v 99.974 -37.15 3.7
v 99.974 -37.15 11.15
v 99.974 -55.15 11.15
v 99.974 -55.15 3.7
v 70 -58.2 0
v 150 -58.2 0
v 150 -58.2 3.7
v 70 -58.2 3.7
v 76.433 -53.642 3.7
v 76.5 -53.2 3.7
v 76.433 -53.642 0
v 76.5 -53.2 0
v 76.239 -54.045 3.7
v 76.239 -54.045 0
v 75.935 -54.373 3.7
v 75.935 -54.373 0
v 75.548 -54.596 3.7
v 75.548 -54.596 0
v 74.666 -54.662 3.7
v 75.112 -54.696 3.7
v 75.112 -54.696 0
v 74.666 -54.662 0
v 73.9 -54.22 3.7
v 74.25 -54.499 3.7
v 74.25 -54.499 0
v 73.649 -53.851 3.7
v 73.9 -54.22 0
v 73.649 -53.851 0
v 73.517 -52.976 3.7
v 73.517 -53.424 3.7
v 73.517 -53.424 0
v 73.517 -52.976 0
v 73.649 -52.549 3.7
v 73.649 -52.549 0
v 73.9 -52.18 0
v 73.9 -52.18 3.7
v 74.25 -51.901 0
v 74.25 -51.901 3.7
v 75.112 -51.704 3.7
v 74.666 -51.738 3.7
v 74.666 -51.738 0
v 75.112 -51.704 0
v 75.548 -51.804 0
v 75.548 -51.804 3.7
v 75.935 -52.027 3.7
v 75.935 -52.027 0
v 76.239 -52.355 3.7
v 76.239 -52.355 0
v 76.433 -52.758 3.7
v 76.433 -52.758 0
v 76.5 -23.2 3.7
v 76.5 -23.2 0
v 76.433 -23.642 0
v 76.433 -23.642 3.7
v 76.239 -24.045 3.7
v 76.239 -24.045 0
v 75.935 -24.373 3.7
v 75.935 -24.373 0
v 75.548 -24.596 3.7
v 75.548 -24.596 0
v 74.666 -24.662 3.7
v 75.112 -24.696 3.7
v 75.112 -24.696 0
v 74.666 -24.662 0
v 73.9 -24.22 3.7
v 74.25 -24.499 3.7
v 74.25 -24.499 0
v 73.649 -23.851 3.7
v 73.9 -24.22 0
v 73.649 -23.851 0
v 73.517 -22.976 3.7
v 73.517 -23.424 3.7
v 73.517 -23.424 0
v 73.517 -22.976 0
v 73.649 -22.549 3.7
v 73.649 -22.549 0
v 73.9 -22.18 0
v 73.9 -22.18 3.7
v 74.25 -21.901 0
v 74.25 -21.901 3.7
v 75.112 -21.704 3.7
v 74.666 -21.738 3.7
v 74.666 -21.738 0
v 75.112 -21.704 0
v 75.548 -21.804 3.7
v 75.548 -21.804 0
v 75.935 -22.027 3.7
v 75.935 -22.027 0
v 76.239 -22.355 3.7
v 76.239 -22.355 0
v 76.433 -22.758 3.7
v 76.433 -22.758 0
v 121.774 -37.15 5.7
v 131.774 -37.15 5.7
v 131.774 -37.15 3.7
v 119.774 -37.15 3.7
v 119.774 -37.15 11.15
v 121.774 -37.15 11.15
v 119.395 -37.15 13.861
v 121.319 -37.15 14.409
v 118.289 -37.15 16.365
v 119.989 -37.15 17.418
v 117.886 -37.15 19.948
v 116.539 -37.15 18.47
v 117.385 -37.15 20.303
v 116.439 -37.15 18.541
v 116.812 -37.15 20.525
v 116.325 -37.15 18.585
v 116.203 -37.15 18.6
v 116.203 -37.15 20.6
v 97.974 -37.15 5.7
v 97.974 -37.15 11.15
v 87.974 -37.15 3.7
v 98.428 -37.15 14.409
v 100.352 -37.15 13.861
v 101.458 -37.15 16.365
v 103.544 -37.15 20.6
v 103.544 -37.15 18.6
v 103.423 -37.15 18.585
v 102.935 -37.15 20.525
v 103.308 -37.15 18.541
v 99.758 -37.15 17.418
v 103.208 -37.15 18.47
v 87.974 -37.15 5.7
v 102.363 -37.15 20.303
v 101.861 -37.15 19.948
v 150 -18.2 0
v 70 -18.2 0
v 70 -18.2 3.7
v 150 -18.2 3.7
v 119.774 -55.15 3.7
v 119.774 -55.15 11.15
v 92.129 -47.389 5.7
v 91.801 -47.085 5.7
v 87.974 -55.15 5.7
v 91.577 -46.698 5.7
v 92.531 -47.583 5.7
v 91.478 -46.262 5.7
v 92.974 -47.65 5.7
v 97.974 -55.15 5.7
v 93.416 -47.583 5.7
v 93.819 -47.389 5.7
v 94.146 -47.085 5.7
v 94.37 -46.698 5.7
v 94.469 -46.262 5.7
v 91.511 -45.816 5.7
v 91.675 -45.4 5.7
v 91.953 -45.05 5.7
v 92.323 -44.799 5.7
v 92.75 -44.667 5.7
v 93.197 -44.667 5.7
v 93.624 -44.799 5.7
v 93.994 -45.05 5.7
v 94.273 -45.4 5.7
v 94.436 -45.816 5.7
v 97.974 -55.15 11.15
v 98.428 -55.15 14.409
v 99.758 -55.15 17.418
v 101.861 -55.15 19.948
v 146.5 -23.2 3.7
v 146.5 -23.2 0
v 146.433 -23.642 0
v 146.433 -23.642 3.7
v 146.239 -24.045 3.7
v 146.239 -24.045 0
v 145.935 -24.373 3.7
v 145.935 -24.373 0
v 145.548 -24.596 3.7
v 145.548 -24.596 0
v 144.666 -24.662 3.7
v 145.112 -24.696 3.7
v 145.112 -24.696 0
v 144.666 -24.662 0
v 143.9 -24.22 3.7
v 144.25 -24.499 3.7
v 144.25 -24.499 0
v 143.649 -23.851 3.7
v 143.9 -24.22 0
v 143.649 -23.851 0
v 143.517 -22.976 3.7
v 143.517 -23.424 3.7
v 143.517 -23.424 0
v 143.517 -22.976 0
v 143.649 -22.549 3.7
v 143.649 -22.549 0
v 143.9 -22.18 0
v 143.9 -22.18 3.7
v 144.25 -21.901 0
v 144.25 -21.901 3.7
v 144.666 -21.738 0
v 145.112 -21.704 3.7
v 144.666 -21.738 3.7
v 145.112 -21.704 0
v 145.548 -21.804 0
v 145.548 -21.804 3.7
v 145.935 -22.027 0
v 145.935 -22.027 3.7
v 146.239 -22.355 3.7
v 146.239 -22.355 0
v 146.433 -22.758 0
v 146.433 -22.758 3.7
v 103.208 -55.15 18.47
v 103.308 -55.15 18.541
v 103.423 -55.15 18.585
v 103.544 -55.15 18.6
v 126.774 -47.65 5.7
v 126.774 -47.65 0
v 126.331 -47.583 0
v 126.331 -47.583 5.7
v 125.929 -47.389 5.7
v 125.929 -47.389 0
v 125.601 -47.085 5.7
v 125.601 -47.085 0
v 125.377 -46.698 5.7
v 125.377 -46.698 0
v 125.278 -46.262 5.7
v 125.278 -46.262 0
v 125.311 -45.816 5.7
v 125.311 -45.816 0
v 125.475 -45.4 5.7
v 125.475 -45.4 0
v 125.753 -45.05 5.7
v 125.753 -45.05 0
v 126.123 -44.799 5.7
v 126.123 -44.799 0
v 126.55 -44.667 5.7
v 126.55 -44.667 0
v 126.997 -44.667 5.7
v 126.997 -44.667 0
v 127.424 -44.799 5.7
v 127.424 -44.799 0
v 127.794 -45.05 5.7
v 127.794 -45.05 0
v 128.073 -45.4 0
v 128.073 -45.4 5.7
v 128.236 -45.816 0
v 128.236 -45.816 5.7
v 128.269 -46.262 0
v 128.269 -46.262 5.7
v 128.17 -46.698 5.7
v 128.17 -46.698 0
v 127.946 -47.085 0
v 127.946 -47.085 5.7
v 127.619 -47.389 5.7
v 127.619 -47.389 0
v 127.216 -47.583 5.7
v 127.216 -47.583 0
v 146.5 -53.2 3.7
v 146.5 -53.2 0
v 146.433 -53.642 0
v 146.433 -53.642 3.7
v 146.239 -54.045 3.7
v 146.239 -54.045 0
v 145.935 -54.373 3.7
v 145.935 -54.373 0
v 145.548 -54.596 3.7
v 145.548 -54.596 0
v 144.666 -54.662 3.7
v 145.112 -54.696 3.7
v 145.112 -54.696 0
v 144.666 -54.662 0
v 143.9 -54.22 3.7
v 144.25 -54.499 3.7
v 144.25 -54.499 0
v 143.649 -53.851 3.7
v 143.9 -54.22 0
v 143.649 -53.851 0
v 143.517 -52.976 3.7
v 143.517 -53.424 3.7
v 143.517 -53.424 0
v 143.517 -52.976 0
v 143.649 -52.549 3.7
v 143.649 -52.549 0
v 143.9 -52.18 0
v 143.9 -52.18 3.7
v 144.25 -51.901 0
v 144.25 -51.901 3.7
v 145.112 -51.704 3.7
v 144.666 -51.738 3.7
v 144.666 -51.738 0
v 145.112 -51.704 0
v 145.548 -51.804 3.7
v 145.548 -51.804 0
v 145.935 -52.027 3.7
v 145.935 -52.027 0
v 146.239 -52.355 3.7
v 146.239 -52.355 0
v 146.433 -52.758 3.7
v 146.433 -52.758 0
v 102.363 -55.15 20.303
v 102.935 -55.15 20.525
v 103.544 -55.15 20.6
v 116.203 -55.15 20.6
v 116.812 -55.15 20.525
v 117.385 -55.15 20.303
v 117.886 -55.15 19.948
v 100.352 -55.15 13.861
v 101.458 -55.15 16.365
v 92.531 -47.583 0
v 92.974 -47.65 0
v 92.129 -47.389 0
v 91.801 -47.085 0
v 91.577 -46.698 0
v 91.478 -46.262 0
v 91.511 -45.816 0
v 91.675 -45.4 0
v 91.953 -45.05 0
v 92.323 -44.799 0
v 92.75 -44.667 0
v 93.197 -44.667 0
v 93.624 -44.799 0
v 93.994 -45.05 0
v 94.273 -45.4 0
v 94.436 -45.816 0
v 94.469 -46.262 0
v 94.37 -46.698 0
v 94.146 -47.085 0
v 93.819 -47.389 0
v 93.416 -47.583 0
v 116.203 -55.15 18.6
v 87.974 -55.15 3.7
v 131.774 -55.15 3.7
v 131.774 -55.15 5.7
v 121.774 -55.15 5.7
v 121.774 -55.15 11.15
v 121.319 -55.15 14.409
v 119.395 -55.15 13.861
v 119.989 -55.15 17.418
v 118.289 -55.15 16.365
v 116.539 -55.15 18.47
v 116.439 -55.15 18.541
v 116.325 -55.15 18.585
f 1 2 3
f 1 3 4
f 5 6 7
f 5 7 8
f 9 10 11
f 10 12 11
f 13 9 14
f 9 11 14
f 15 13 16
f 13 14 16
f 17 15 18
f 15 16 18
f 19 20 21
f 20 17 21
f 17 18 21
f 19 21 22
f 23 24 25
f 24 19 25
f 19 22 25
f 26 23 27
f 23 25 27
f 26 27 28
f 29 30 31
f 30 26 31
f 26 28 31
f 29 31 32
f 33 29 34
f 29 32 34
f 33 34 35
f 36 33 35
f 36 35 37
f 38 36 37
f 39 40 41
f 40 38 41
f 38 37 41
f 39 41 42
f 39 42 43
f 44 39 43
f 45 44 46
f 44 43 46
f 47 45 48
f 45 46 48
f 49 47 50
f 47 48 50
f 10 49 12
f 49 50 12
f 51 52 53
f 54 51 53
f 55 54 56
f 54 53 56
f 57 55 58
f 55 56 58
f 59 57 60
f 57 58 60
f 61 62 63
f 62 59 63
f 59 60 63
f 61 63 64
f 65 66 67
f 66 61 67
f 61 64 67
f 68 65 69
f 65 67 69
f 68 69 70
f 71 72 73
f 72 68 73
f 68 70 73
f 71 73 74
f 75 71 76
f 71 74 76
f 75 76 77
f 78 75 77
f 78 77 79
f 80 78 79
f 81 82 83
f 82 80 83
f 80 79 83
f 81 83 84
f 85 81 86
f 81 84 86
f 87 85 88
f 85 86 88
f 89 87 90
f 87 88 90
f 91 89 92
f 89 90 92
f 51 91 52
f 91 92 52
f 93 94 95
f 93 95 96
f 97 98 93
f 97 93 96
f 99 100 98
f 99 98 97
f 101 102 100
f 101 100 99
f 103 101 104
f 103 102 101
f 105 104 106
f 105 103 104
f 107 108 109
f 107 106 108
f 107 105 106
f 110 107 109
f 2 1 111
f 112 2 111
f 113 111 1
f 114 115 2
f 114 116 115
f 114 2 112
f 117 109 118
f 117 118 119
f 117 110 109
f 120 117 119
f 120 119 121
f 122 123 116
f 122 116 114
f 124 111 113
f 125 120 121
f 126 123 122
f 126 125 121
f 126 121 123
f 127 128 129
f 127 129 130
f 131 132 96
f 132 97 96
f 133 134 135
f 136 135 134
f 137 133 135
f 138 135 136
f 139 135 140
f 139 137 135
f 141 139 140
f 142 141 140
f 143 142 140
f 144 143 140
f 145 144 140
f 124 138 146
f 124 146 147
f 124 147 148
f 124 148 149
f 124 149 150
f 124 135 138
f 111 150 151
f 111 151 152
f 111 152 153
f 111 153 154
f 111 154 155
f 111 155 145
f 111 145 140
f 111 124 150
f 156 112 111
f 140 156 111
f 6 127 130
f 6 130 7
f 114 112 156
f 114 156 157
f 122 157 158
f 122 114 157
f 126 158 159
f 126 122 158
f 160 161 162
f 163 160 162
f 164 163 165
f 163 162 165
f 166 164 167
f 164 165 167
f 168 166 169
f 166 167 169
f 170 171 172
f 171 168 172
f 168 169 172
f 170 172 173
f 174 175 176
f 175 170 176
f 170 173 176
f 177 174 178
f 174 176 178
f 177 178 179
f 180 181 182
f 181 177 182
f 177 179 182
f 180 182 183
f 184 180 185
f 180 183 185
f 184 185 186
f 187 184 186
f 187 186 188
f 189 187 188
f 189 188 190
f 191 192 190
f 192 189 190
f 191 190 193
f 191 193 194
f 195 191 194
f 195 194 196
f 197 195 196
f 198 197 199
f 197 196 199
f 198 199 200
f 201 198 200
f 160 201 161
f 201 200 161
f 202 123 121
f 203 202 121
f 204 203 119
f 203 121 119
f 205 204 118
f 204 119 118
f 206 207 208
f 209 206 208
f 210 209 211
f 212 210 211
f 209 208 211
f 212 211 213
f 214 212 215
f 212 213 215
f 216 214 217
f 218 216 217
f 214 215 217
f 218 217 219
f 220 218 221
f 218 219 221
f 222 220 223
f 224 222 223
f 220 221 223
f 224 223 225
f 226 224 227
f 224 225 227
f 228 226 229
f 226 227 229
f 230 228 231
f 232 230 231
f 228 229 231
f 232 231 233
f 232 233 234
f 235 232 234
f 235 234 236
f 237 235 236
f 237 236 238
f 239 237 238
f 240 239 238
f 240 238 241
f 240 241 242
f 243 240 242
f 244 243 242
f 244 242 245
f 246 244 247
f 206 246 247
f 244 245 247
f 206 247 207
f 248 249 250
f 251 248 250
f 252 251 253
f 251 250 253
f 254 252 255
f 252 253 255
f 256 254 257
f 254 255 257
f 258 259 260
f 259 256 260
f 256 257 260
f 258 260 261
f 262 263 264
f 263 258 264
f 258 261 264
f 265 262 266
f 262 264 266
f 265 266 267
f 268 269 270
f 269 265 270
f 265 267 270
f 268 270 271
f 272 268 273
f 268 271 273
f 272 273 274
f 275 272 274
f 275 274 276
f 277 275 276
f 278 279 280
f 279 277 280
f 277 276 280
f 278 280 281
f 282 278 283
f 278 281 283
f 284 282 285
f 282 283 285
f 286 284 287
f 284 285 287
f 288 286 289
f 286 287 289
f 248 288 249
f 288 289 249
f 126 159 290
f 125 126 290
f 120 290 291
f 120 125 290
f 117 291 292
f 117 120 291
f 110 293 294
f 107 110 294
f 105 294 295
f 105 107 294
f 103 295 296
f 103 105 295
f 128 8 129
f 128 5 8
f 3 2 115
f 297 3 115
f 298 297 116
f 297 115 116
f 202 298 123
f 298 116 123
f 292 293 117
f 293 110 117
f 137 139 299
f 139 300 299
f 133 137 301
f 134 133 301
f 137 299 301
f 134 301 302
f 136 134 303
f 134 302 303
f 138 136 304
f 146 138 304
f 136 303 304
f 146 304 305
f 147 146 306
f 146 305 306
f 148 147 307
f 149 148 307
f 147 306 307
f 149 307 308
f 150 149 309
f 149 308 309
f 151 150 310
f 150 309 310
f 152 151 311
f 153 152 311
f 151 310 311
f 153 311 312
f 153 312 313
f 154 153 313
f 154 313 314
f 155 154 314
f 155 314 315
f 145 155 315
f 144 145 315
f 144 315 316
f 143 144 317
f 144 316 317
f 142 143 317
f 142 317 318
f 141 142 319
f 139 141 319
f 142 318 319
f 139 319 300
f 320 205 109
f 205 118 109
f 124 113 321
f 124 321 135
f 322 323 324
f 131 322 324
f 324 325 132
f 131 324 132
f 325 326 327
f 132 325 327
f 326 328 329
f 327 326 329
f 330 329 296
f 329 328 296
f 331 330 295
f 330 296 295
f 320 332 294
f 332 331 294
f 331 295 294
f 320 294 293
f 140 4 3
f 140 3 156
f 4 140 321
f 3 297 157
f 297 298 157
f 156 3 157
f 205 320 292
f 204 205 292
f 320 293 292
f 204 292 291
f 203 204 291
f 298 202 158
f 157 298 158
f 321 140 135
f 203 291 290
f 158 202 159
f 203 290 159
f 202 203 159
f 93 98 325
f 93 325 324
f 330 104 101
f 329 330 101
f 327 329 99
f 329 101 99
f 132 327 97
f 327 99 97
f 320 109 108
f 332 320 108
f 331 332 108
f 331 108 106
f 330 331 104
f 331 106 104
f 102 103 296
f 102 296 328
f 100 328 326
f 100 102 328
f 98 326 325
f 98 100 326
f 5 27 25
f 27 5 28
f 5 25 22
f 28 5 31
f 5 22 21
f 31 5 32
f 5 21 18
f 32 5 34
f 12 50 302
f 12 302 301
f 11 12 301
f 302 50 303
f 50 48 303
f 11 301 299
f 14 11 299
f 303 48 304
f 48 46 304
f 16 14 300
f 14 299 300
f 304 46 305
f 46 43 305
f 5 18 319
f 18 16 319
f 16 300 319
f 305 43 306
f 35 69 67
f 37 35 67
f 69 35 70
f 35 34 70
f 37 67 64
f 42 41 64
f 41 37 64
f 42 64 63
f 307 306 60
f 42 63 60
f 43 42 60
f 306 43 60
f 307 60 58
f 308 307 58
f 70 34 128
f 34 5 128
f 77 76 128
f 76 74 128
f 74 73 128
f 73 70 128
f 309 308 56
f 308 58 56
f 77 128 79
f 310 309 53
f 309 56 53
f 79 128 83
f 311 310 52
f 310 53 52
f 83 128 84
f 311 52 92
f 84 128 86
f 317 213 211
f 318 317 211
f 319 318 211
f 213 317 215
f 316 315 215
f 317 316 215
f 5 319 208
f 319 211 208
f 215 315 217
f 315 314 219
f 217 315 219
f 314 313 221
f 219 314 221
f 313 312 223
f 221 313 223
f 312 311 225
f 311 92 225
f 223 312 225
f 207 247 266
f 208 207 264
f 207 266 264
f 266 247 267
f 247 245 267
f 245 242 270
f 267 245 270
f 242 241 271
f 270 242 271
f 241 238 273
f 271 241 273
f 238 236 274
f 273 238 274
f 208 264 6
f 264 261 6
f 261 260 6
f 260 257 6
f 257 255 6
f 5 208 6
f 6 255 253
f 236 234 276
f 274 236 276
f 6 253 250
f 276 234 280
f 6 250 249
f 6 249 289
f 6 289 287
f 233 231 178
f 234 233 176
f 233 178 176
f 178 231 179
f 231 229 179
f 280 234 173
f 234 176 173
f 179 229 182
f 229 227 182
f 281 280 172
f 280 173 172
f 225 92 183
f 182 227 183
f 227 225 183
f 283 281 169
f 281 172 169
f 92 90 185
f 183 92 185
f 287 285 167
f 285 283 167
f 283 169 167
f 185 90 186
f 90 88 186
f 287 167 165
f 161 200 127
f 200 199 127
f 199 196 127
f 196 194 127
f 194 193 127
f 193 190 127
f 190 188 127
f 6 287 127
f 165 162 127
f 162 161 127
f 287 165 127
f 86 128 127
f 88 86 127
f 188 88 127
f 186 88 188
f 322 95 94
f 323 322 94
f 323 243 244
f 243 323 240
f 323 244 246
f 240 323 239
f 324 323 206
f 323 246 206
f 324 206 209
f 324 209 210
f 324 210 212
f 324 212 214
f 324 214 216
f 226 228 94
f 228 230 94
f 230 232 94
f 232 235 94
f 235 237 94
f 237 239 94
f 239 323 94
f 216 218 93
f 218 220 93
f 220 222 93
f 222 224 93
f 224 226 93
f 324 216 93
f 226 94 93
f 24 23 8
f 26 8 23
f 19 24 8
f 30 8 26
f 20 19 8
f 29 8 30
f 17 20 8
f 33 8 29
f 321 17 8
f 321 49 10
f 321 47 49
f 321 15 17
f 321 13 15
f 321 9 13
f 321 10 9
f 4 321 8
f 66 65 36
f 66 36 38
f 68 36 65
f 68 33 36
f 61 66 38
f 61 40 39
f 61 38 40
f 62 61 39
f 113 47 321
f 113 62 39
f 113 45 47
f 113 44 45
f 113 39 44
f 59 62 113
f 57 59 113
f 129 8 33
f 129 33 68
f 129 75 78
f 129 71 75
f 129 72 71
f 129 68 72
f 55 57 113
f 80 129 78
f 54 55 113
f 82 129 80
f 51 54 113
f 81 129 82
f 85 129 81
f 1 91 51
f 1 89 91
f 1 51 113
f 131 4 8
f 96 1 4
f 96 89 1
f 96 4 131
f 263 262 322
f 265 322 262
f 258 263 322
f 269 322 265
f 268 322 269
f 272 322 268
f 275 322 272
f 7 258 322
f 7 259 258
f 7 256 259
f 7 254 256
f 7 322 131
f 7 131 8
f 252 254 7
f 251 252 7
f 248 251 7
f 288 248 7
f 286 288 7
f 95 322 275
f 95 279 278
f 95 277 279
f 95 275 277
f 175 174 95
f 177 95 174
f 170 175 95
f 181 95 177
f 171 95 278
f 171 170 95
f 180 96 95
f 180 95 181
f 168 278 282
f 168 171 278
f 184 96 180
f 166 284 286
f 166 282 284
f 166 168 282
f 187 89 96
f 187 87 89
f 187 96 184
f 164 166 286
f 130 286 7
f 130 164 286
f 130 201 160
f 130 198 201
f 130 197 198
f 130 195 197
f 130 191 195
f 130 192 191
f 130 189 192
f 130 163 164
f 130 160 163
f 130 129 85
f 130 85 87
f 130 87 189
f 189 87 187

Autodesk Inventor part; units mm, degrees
ref_plane "YZ Plane" through (0, 0, 0) normal (1, 0, 0) x (0, 1, 0)
ref_plane "XZ Plane" through (0, 0, 0) normal (0, 1, 0) x (-1, 0, 0)
ref_plane "XY Plane" through (0, 0, 0) normal (0, 0, 1) x (1, 0, 0)
sketch "Sketch1" plane through (0, 0, 0) normal (0, 0, 1) x (1, 0, 0)
  line L0 (-200, 100) -> (200, 100) projected
  line L1 (-200, -100) -> (-200, 100) projected
  line L2 (200, -100) -> (-200, -100) projected
  line L3 (200, 100) -> (200, -100) projected
  line L4 (-121, -18.2) -> (-94.2029, -18.2) projected
  line L5 (-94.2029, -18.2) -> (188.9125, -18.2)
  line L6 (110, -18.2) -> (70, -18.2)
  line L7 (70, -18.2) -> (150, -18.2)
  line L8 (150, -18.2) -> (150, -58.2)
  line L9 (150, -58.2) -> (70, -58.2)
  line L10 (70, -58.2) -> (70, -18.2)
  line L11 (150, -58.2) -> (145, -58.2)
  circle A0 centre (145, -53.2) radius 1.5
  circle A1 centre (145, -23.2) radius 1.5
  circle A2 centre (75, -23.2) radius 1.5
  circle A3 centre (75, -53.2) radius 1.5
  point P0 (0, 0)
  dimension "d2" = 80
  dimension "d3" = 40
  dimension "d4" = 5
extrude "Extrusion1" add sketch "Sketch1" along normal blind 3.7 contours L5 L8 L9 L10
ref_plane "Work Plane1" through (109.8736, -37.15, 11.15) normal (0, 1, 0) x (-1, 0, 0)
sketch "Sketch2" plane through (109.8736, -37.15, 11.15) normal (0, 1, 0) x (-1, 0, 0)
  line L0 (3.756, 7.45) -> (-3.756, 7.45)
  arc A0 (-6.6658, 7.3197) -> (-9.9, 0) centre (0, 0) ccw
  arc A1 (9.9, 0) -> (6.6658, 7.3197) centre (0, 0) ccw
  arc A2 (6.6658, 7.3197) -> (6.3291, 7.45) centre (6.3291, 6.95) ccw
  arc A3 (-6.3291, 7.45) -> (-6.6658, 7.3197) centre (-6.3291, 6.95) ccw
  line L1 (-3.756, 7.45) -> (-6.3291, 7.45)
  line L2 (6.3291, 7.45) -> (3.756, 7.45)
  arc A4 (-6.3291, 9.45) -> (-8.0124, 8.7984) centre (-6.3291, 6.95) ccw
  line L3 (-6.3291, 9.45) -> (-3.756, 9.45)
  line L4 (-3.756, 9.45) -> (3.756, 9.45)
  line L5 (3.756, 9.45) -> (6.3291, 9.45)
  arc A5 (8.0124, 8.7984) -> (6.3291, 9.45) centre (6.3291, 6.95) ccw
  line L6 (-11.9, 0) -> (-11.9, -5.45)
  line L7 (39.8736, -7.45) -> (-40.1264, -7.45) projected
  line L8 (-11.9, -7.45) -> (-21.9, -7.45)
  line L9 (-21.9, -7.45) -> (-21.9, -5.45)
  line L10 (-21.9, -5.45) -> (-11.9, -5.45)
  line L11 (11.9, -7.45) -> (21.9, -7.45)
  line L12 (21.9, -7.45) -> (21.9, -5.45)
  line L13 (21.9, -5.45) -> (11.9, -5.45)
  line L14 (9.9, 0) -> (9.9, -7.45)
  line L15 (-9.9, 0) -> (-9.9, -7.45)
  arc A6 (-8.0124, 8.7984) -> (-11.9, 0) centre (0, 0) ccw
  arc A7 (11.9, 0) -> (8.0124, 8.7984) centre (0, 0) ccw
  line L16 (11.9, 0) -> (11.9, -5.45)
  line L17 (-21.9, -7.45) -> (21.9, -7.45)
  point P0 (109.8736, -11.15)
  point P1 (21.9, -7.45)
  point P2 (-21.9, -7.45)
  dimension "d21" = 10
  dimension "d22" = 2
  dimension "d23" = 10
  dimension "d24" = 2
  dimension "d26" = 2
extrude "Extrusion2" add sketch "Sketch2" against normal blind 18 contours L0 L1 A3 A0 L15 L7 L9 L10 L6 A6 A4 L3 L4 L5 A5 A7 L16 L13 L12 L14 A1 A2 L2
sketch "Sketch3" plane through (121.7736, -37.15, 5.7) normal (0, 0, 1) x (1, 0, 0)
  line L0 (10, -18) -> (0, -18) projected
  circle A0 centre (5, -9) radius 1.5
  line L1 (-33.8, -18) -> (-33.8, 0) projected
  line L2 (-33.8, -18) -> (-33.8, -9)
  circle A1 centre (-28.8, -9) radius 1.5
  point P0 (-121.7736, 37.15)
hole "Hole1" at (126.7736, -46.15, 5.7) at (92.9736, -46.15, 5.7) direction (0, 0, -1) diameter 3 end through all
properties part number "suporte_motor_1"
